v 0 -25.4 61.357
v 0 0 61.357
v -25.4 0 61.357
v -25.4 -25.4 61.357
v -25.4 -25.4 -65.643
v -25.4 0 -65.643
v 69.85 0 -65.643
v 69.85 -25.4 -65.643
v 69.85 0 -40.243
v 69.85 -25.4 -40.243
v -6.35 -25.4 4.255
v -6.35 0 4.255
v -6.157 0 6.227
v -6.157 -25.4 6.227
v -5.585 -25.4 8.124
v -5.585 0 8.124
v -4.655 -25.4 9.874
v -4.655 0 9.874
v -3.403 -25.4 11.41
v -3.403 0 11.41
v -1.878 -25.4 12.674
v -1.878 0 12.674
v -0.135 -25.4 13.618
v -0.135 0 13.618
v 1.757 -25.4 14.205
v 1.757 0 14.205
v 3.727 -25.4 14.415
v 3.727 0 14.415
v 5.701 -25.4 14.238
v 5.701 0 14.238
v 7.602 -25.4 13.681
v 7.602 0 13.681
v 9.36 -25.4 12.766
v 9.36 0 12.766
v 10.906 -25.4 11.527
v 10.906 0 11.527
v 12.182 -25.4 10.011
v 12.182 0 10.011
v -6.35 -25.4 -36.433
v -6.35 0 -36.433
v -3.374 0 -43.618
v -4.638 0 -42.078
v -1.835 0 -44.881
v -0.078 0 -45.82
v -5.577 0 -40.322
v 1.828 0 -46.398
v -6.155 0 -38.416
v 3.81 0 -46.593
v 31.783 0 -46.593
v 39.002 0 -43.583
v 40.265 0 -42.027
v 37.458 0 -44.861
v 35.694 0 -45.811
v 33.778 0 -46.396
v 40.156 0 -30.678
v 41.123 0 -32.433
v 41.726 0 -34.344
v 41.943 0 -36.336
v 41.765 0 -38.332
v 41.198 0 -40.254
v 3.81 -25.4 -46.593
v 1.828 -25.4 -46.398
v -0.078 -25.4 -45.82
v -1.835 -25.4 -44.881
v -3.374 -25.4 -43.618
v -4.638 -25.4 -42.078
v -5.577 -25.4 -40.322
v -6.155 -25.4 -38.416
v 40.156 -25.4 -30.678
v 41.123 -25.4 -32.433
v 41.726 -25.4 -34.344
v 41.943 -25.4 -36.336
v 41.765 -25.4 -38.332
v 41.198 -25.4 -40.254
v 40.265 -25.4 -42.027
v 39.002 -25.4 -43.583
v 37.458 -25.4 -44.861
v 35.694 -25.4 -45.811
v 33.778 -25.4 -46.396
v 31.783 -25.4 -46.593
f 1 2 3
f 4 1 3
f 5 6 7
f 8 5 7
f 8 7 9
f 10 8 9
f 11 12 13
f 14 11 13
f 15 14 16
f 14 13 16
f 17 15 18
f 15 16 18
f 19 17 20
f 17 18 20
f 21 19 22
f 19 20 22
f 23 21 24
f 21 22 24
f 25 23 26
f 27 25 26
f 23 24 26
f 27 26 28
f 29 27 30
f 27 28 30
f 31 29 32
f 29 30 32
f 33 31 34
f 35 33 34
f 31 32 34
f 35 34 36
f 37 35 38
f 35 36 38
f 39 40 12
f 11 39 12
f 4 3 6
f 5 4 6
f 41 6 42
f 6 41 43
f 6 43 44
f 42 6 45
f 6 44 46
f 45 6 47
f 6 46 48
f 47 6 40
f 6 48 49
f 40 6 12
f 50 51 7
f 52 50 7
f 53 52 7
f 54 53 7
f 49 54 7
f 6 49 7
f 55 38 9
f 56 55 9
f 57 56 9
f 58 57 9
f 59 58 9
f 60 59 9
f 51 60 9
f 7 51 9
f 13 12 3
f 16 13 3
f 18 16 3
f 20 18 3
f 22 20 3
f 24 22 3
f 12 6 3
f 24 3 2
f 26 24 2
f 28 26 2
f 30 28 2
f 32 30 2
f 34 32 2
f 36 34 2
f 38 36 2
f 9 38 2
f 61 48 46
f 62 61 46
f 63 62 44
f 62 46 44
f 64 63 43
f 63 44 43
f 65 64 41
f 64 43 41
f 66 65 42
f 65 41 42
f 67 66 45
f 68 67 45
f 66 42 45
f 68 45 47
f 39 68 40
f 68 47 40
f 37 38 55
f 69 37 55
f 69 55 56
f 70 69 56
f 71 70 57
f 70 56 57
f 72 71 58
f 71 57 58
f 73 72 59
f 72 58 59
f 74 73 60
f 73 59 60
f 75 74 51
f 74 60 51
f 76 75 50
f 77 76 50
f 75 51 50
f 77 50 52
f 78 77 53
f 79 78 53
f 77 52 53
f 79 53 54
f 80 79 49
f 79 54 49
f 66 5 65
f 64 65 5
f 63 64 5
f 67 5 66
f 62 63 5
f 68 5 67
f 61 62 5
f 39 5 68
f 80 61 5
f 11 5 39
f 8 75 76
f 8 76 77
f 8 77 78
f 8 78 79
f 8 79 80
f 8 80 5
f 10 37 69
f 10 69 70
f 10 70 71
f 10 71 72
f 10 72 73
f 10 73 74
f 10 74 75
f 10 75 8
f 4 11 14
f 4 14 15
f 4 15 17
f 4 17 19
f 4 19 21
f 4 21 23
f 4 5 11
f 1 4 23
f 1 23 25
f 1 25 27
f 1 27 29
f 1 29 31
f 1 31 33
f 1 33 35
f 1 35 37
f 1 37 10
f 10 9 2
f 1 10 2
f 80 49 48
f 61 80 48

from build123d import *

# Parameters (mm, degrees)
F4_DEPTH = 25.4


with BuildPart() as f4:
    # F3 (on Front) → F4 (new body)
    with BuildSketch(Plane.XZ):
        Polygon((0, 61.356521979), (-25.4, 61.356521979), (-25.4, -65.643478021), (69.85, -65.643478021), (69.85, -40.243478021), align=None)
        with BuildLine():
            ThreePointArc((-6.35, 4.2551029085), (0.7964159254, 13.9578814293), (12.1822659499, 10.011035749))
            Line((12.1822659499, 10.011035749), (40.1556653389, -30.6775451805))
            ThreePointArc((40.1556653389, -30.6775451805), (40.7752256123, -41.1634527747), (31.783399389, -46.593478021))
            Line((31.783399389, -46.593478021), (3.81, -46.593478021))
            ThreePointArc((3.81, -46.593478021), (-3.3742048969, -43.6176829179), (-6.35, -36.433478021))
            Line((-6.35, -36.433478021), (-6.35, 4.2551029085))
        make_face(mode=Mode.SUBTRACT)
    extrude(amount=F4_DEPTH)


solid = f4.part
